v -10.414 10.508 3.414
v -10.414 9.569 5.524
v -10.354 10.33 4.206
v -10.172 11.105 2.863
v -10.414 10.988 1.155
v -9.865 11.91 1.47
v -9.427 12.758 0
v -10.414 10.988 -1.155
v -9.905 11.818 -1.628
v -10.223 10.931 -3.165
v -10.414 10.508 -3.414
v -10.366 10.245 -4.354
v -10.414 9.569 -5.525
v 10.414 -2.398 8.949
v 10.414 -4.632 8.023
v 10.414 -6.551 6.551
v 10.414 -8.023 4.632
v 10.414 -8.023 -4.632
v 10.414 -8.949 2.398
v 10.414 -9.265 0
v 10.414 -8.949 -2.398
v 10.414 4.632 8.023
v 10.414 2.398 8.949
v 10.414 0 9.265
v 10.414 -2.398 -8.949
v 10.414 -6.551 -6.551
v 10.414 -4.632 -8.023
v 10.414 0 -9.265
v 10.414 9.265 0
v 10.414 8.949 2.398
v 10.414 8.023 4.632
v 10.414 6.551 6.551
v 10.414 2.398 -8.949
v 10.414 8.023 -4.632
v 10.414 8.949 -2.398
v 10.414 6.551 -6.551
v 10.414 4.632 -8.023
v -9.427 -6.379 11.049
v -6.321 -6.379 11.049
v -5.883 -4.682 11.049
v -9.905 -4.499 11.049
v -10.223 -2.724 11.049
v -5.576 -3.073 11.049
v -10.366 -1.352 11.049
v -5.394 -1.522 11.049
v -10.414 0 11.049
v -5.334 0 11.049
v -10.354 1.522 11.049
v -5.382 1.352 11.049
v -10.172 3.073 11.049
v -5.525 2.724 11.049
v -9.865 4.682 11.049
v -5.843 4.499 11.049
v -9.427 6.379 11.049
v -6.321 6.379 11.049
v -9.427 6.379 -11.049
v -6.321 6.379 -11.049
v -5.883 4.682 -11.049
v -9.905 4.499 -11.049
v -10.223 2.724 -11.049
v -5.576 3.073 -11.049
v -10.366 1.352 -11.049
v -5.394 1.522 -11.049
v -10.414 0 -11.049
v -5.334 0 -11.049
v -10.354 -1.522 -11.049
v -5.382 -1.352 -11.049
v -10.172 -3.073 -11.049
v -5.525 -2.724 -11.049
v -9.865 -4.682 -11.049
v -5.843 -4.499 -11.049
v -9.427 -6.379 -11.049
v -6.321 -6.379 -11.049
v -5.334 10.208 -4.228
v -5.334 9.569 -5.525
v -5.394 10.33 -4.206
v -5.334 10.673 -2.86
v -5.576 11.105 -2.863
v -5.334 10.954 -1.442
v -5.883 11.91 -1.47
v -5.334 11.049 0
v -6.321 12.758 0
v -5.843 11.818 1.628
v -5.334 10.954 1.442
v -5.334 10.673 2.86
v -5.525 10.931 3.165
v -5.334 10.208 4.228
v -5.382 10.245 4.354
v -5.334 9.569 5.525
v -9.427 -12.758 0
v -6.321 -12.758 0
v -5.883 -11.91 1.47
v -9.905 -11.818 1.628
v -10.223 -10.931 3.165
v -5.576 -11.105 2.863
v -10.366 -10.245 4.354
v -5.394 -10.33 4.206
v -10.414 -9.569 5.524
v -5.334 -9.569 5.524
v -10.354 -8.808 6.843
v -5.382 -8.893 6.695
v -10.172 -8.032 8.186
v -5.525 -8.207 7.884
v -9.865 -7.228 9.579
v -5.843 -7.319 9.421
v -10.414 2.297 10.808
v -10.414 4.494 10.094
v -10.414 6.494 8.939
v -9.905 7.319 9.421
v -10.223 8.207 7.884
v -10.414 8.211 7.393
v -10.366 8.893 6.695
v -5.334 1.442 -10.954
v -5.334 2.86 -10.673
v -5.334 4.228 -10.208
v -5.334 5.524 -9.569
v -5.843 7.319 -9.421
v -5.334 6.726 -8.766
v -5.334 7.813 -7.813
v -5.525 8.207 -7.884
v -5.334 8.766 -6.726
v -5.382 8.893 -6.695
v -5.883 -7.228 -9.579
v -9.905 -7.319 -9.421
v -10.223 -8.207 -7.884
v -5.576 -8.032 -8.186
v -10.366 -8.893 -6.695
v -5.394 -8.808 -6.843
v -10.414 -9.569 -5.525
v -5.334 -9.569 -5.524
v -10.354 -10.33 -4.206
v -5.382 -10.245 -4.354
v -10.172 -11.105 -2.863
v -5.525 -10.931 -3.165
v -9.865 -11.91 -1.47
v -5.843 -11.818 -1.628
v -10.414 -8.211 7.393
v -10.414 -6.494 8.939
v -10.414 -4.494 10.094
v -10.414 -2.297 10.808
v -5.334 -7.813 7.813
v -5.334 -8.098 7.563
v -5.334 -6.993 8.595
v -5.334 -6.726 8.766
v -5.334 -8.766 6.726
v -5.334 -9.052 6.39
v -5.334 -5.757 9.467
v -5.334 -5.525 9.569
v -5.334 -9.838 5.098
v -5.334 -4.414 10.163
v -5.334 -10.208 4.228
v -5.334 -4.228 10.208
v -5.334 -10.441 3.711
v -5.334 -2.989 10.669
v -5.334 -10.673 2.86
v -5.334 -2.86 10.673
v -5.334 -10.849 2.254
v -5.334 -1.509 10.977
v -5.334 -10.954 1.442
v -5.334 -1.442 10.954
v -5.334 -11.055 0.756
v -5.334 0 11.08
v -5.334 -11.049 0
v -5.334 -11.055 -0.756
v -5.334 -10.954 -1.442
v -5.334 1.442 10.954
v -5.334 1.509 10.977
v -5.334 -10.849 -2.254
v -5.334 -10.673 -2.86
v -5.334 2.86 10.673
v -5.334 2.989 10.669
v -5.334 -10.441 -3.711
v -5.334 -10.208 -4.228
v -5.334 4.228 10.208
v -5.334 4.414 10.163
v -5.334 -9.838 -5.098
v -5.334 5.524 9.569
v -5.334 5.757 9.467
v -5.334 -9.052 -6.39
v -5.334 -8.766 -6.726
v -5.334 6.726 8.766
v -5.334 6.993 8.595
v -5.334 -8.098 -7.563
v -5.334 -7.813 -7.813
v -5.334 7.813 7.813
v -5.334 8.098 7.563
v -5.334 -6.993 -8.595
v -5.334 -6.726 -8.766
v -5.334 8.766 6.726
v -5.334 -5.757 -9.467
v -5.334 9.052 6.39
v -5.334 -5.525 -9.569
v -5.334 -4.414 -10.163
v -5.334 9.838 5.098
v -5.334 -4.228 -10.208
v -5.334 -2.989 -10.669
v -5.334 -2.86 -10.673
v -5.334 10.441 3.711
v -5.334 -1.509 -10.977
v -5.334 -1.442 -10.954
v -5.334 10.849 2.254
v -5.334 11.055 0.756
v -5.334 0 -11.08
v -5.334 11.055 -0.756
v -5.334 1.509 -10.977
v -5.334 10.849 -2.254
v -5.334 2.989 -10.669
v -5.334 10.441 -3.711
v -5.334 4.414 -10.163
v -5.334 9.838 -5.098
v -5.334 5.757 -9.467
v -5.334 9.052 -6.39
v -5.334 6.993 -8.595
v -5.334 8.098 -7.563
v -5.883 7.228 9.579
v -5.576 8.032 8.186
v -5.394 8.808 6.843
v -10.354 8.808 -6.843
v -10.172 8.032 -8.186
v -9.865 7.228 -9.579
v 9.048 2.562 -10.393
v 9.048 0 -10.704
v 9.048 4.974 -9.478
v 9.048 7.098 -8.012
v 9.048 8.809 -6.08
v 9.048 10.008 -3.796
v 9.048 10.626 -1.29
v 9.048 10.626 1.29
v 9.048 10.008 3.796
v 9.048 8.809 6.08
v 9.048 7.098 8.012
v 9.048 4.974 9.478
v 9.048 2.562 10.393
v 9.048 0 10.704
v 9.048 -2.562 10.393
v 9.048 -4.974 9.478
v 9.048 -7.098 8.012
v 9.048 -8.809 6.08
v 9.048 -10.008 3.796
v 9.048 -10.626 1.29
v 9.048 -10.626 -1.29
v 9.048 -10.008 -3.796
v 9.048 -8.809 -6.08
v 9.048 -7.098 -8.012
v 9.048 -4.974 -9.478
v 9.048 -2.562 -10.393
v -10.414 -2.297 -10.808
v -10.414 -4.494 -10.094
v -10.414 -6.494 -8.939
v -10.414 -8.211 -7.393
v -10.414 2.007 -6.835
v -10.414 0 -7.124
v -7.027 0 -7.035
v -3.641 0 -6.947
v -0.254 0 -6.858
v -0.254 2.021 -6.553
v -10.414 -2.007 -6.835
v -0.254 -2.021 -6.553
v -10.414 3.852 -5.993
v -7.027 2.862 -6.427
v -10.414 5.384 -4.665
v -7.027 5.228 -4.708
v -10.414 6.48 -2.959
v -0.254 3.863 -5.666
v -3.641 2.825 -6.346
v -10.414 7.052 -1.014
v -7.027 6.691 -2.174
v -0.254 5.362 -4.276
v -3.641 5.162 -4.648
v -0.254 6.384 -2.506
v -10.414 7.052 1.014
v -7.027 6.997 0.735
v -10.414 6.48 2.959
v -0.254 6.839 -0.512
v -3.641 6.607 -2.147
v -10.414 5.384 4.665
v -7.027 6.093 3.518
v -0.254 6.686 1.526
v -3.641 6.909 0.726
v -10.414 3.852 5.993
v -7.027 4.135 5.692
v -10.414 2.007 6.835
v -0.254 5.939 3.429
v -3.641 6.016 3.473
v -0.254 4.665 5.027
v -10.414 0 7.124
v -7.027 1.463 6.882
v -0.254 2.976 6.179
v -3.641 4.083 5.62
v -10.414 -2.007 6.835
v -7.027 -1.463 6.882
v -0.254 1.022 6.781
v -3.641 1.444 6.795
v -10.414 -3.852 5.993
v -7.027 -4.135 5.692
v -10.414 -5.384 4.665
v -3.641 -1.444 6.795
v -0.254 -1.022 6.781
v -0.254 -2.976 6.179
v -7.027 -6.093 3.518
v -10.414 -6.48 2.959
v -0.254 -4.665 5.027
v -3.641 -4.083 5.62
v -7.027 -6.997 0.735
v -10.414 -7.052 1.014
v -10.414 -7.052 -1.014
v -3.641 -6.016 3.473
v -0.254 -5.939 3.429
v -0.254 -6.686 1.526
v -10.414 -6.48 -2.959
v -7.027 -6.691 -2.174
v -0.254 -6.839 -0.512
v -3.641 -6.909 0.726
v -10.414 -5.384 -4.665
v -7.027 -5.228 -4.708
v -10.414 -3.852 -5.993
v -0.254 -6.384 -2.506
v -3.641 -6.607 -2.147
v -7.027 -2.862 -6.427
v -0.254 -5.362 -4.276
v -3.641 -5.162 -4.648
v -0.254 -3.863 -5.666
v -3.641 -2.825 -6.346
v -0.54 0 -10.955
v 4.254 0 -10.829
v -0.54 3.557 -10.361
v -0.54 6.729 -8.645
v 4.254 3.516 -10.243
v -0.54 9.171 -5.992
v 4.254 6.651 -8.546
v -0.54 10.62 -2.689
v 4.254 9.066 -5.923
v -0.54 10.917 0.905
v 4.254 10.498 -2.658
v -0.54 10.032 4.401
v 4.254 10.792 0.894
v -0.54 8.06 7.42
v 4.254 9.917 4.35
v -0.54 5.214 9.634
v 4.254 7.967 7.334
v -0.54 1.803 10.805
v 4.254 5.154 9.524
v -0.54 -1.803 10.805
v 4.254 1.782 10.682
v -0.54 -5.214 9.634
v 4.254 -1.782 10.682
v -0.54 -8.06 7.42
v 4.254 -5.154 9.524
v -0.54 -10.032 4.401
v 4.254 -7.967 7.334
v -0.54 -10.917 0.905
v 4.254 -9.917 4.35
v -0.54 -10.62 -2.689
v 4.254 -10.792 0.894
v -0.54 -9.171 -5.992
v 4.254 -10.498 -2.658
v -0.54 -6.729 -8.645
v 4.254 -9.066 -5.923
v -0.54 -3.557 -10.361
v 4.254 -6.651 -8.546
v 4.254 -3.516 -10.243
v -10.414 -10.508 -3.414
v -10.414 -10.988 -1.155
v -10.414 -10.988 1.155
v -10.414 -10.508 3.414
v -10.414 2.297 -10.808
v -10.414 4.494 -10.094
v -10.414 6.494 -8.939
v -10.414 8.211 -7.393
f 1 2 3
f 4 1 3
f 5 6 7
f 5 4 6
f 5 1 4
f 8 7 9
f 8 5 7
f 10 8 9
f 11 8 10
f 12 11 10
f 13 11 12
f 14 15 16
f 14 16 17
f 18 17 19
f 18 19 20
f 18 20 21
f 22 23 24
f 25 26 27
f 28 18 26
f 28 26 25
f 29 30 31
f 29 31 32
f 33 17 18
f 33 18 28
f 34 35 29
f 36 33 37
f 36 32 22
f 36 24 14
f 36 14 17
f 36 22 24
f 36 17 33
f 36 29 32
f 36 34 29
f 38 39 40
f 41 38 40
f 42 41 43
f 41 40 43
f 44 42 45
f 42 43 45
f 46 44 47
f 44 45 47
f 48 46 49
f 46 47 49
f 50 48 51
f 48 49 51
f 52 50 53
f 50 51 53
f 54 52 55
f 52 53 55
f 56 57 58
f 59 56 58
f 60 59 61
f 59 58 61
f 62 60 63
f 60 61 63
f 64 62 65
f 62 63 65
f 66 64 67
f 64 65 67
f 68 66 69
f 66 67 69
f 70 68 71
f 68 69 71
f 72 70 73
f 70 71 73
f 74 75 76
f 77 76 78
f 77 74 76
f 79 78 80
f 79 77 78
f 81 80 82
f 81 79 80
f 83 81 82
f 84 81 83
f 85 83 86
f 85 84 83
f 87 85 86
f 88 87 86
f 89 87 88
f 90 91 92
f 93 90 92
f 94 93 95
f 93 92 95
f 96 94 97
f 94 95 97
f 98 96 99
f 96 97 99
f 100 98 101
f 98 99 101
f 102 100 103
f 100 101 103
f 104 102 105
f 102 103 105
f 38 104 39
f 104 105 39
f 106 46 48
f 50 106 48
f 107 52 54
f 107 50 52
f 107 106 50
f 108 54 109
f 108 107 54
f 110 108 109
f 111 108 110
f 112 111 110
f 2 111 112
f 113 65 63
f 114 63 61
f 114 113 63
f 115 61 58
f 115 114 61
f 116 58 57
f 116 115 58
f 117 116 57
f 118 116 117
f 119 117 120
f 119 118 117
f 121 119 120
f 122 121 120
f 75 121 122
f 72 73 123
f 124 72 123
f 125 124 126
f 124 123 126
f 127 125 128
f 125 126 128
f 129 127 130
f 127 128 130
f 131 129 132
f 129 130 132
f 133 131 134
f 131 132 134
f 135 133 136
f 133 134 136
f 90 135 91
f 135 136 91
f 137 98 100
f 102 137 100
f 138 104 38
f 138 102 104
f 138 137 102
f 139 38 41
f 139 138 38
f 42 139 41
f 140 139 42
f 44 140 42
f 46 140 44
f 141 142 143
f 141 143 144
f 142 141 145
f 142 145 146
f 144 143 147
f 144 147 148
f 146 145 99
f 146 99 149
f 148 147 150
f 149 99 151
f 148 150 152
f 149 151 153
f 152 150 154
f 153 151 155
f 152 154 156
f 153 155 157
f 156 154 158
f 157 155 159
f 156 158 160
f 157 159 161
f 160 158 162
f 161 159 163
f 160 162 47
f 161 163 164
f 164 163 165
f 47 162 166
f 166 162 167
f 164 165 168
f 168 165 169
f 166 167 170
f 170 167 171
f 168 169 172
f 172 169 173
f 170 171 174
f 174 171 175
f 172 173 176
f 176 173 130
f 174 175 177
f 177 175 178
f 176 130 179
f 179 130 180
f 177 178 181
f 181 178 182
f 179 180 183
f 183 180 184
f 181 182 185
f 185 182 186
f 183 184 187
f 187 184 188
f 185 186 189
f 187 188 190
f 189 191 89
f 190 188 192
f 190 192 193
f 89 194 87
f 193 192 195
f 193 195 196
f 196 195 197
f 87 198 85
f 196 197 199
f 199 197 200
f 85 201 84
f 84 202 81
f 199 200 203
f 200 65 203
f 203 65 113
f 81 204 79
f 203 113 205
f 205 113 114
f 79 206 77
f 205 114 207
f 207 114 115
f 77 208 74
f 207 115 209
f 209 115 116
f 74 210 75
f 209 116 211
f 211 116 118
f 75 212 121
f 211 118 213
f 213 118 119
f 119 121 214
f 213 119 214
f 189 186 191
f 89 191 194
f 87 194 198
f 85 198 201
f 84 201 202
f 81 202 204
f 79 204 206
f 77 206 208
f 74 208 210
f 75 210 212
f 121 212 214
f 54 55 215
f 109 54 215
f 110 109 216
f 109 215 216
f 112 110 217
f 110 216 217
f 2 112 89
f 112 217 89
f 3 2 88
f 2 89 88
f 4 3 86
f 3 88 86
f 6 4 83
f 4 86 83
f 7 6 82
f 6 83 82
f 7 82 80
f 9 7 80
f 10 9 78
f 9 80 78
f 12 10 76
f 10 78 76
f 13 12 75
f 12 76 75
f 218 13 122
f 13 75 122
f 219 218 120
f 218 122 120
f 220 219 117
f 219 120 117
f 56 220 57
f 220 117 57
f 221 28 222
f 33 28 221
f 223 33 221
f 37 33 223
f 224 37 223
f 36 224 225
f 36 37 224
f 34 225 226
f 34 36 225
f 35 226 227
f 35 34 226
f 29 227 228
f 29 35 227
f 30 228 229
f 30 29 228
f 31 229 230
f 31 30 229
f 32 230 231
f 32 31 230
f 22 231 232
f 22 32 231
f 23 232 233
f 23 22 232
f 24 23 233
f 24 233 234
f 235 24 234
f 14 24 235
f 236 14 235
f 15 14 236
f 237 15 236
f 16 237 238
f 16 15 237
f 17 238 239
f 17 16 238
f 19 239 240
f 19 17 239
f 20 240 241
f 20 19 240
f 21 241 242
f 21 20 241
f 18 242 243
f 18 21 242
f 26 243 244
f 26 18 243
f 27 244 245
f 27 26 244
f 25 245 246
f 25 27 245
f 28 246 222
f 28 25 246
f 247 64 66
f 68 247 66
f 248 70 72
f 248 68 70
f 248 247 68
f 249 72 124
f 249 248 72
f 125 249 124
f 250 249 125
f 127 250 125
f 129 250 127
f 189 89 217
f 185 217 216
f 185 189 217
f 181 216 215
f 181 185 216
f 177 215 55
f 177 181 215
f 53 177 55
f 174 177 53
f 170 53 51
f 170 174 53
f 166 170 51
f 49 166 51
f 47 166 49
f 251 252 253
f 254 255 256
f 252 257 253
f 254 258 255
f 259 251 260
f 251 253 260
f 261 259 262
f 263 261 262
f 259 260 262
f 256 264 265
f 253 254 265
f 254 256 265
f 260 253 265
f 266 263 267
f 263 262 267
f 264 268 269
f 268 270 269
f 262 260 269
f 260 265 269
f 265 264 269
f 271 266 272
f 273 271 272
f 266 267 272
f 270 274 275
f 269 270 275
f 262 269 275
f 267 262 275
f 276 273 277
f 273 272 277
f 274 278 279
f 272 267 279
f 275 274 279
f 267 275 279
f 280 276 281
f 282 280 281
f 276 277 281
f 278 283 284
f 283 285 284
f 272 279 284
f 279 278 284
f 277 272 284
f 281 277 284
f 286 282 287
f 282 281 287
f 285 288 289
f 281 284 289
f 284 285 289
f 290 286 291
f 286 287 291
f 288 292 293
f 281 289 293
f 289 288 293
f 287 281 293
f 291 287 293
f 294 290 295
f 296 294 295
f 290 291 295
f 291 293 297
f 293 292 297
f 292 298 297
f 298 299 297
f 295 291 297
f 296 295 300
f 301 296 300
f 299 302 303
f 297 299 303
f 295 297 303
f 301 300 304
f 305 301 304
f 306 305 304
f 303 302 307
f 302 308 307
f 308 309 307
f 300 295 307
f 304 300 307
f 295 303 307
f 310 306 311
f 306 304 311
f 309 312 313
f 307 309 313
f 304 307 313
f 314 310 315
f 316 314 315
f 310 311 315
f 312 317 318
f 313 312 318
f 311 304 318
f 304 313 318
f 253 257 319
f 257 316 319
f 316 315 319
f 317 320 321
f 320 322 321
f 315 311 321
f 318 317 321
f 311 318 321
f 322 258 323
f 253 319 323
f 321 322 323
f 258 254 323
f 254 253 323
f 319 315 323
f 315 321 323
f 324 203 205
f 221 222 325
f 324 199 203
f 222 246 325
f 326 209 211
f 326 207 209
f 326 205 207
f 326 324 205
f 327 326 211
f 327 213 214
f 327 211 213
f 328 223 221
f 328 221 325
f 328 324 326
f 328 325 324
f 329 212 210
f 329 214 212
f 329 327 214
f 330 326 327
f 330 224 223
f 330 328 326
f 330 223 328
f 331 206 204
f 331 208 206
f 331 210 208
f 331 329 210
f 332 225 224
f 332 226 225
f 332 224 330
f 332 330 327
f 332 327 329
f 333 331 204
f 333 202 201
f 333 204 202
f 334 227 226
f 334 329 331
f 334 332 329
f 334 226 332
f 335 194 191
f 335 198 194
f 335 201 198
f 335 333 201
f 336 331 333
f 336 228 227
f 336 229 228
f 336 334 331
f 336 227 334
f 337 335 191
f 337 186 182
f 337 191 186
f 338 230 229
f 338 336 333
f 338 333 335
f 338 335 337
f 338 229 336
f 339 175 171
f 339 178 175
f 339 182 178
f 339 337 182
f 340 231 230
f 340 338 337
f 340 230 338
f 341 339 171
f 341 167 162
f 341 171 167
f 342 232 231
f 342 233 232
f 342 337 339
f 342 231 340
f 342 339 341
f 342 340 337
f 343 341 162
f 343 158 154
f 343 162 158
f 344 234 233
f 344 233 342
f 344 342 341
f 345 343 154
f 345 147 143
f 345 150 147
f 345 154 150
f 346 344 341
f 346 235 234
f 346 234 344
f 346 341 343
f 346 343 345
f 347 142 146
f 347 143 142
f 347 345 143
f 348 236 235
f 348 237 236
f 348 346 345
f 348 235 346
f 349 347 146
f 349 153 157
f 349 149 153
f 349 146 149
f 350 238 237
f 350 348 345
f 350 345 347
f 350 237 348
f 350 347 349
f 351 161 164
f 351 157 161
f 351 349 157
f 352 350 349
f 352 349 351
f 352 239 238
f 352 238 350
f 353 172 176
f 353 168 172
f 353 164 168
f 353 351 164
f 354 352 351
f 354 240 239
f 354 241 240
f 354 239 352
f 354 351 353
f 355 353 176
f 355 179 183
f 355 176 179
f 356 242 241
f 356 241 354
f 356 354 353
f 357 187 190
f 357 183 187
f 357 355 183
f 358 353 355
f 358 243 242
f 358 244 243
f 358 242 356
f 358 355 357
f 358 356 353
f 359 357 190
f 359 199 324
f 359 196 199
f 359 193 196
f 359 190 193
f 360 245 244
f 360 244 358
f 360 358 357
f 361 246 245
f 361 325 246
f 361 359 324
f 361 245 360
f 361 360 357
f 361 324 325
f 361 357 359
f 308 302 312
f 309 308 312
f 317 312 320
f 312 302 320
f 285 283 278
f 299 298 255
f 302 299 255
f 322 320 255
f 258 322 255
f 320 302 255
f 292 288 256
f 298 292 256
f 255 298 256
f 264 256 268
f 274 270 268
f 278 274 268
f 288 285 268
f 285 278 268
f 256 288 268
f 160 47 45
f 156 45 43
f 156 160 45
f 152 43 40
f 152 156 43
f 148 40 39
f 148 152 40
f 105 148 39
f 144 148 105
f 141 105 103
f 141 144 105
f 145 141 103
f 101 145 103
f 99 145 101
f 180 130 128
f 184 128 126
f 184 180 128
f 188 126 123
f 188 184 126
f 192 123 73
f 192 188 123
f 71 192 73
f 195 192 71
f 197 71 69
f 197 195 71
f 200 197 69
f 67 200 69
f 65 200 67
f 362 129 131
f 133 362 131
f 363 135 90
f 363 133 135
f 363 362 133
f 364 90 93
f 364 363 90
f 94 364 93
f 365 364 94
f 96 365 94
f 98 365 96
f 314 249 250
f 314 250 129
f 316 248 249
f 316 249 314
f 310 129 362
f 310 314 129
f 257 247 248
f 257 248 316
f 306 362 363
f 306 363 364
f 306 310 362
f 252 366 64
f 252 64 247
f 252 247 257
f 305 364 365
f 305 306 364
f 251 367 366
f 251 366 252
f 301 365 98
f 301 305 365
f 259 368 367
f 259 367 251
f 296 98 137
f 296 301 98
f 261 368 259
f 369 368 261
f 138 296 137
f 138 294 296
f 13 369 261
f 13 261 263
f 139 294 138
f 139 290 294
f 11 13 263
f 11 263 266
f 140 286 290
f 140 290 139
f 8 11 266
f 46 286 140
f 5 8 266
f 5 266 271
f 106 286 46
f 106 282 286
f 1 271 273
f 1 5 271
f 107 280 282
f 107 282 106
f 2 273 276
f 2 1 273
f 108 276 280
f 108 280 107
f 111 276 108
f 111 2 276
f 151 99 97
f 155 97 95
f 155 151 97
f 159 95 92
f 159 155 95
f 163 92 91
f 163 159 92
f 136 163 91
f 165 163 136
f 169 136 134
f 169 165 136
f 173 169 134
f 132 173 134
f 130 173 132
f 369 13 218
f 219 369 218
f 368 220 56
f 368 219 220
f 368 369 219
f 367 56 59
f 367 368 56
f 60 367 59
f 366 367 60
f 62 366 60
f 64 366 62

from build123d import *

# Parameters (mm, degrees)
SKETCH2_R          = 10.668
EXTRUDE1_DEPTH     = 15.748
EXTRUDE1_DRAFT     = 1.5
CHAMFER1_SIZE      = 1.366157143
CHAMFER1_SIZE2     = 1.403374095
EXTRUDE2_DEPTH     = 5.08
SKETCH6_R          = 6.858
CUT_EXTRUDE1_DEPTH = 20.983864039
CUT_EXTRUDE1_DRAFT = 1.5
SKETCH12_OUTSIDE_W = 128.474
SKETCH12_OUTSIDE_H = 131.83
SKETCH12_OUTSIDE_R = 11.049
CUT_EXTRUDE6_DEPTH = 27.820778921
CUT_EXTRUDE6_DRAFT = -60
SKETCH13_OUTSIDE_W = 115.58
SKETCH13_OUTSIDE_H = 118.936
SKETCH13_OUTSIDE_R = 11.049
CUT_EXTRUDE7_DEPTH = 24.098660176
CUT_EXTRUDE7_DRAFT = -60


with BuildPart() as part:
    # Sketch2 → Extrude1 (with draft: the straight prism first)
    with BuildSketch(Plane(origin=(10.414, 0, 0), x_dir=(0, 0, -1), z_dir=(1, 0, 0))):
        Circle(SKETCH2_R)
    extrude(amount=-EXTRUDE1_DEPTH)
    # Extrude1: the draft: its side faces are tilted about the plane it starts from
    extrude1_sides = [part.faces().sort_by_distance(p)[0] for p in [
        (2.54, 0, 10.668),
    ]]
    draft(extrude1_sides, Plane(origin=(10.414, 0, 0), x_dir=(0, 0, -1), z_dir=(1, 0, 0)), EXTRUDE1_DRAFT)

    # Chamfer1
    chamfer1_edges = [part.edges().sort_by_distance(p)[0] for p in [
        (10.414, 0, 10.668),
    ]]
    chamfer1_side = [part.faces().sort_by_distance(p)[0] for p in [
        (2.54, 0, 10.874187946),
    ]]
    chamfer(chamfer1_edges, length=CHAMFER1_SIZE, length2=CHAMFER1_SIZE2, reference=chamfer1_side[0])

    # Sketch5 → Extrude2 (add)
    with BuildSketch(Plane.ZY.offset(5.334)):
        Polygon((0, 12.758286249), (-11.049, 6.379143124), (-11.049, -6.379143124), (0, -12.758286249), (11.049, -6.379143124), (11.049, 6.379143124), align=None)
    extrude(amount=EXTRUDE2_DEPTH)


with BuildPart() as cut_extrude1_tool:
    # Sketch6 → Cut-Extrude1 (with draft: the straight prism first)
    with BuildSketch(Plane(origin=(-0.254, 0, 0), x_dir=(0, 0, -1), z_dir=(1, 0, 0))):
        Circle(SKETCH6_R)
    extrude(amount=-CUT_EXTRUDE1_DEPTH)
    # Cut-Extrude1: the draft: its side faces are tilted about the plane it starts from
    cut_extrude1_sides = [cut_extrude1_tool.faces().sort_by_distance(p)[0] for p in [
        (-10.745932019, 0, 6.858),
    ]]
    draft(cut_extrude1_sides, Plane(origin=(-0.254, 0, 0), x_dir=(0, 0, -1), z_dir=(1, 0, 0)), CUT_EXTRUDE1_DRAFT)


with BuildPart() as part_1:
    add(part.part)

    # Cut-Extrude1: cut by cut_extrude1_tool
    add(cut_extrude1_tool.part, mode=Mode.SUBTRACT)


with BuildPart() as cut_extrude6_tool:
    # Sketch12 outside → Cut-Extrude6 (with draft: the straight prism first)
    with BuildSketch(Plane.ZY.offset(10.414)):
        Rectangle(SKETCH12_OUTSIDE_W, SKETCH12_OUTSIDE_H)
        Circle(SKETCH12_OUTSIDE_R, mode=Mode.SUBTRACT)
    extrude(amount=-CUT_EXTRUDE6_DEPTH)
    # Cut-Extrude6: the draft: its side faces are tilted about the plane it starts from
    cut_extrude6_sides = [cut_extrude6_tool.faces().sort_by_distance(p)[0] for p in [
        (3.49638946, -65.915, 0),
        (3.49638946, 0, 64.237),
        (3.49638946, 65.915, 0),
        (3.49638946, 0, -64.237),
        (3.49638946, 0, -11.049),
    ]]
    draft(cut_extrude6_sides, Plane.ZY.offset(10.414), CUT_EXTRUDE6_DRAFT)


with BuildPart() as part_2:
    add(part_1.part)

    # Cut-Extrude6: cut by cut_extrude6_tool
    add(cut_extrude6_tool.part, mode=Mode.SUBTRACT)


with BuildPart() as cut_extrude7_tool:
    # Sketch13 outside → Cut-Extrude7 (with draft: the straight prism first)
    with BuildSketch(Plane(origin=(-5.334, 0, 0), x_dir=(0, 0, -1), z_dir=(1, 0, 0))):
        Rectangle(SKETCH13_OUTSIDE_W, SKETCH13_OUTSIDE_H)
        Circle(SKETCH13_OUTSIDE_R, mode=Mode.SUBTRACT)
    extrude(amount=-CUT_EXTRUDE7_DEPTH)
    # Cut-Extrude7: the draft: its side faces are tilted about the plane it starts from
    cut_extrude7_sides = [cut_extrude7_tool.faces().sort_by_distance(p)[0] for p in [
        (-17.383330088, -59.468, 0),
        (-17.383330088, 0, -57.79),
        (-17.383330088, 59.468, 0),
        (-17.383330088, 0, 57.79),
        (-17.383330088, 0, 11.049),
    ]]
    draft(cut_extrude7_sides, Plane(origin=(-5.334, 0, 0), x_dir=(0, 0, -1), z_dir=(1, 0, 0)), CUT_EXTRUDE7_DRAFT)


with BuildPart() as part_3:
    add(part_2.part)

    # Cut-Extrude7: cut by cut_extrude7_tool
    add(cut_extrude7_tool.part, mode=Mode.SUBTRACT)


solid = part_3.part
